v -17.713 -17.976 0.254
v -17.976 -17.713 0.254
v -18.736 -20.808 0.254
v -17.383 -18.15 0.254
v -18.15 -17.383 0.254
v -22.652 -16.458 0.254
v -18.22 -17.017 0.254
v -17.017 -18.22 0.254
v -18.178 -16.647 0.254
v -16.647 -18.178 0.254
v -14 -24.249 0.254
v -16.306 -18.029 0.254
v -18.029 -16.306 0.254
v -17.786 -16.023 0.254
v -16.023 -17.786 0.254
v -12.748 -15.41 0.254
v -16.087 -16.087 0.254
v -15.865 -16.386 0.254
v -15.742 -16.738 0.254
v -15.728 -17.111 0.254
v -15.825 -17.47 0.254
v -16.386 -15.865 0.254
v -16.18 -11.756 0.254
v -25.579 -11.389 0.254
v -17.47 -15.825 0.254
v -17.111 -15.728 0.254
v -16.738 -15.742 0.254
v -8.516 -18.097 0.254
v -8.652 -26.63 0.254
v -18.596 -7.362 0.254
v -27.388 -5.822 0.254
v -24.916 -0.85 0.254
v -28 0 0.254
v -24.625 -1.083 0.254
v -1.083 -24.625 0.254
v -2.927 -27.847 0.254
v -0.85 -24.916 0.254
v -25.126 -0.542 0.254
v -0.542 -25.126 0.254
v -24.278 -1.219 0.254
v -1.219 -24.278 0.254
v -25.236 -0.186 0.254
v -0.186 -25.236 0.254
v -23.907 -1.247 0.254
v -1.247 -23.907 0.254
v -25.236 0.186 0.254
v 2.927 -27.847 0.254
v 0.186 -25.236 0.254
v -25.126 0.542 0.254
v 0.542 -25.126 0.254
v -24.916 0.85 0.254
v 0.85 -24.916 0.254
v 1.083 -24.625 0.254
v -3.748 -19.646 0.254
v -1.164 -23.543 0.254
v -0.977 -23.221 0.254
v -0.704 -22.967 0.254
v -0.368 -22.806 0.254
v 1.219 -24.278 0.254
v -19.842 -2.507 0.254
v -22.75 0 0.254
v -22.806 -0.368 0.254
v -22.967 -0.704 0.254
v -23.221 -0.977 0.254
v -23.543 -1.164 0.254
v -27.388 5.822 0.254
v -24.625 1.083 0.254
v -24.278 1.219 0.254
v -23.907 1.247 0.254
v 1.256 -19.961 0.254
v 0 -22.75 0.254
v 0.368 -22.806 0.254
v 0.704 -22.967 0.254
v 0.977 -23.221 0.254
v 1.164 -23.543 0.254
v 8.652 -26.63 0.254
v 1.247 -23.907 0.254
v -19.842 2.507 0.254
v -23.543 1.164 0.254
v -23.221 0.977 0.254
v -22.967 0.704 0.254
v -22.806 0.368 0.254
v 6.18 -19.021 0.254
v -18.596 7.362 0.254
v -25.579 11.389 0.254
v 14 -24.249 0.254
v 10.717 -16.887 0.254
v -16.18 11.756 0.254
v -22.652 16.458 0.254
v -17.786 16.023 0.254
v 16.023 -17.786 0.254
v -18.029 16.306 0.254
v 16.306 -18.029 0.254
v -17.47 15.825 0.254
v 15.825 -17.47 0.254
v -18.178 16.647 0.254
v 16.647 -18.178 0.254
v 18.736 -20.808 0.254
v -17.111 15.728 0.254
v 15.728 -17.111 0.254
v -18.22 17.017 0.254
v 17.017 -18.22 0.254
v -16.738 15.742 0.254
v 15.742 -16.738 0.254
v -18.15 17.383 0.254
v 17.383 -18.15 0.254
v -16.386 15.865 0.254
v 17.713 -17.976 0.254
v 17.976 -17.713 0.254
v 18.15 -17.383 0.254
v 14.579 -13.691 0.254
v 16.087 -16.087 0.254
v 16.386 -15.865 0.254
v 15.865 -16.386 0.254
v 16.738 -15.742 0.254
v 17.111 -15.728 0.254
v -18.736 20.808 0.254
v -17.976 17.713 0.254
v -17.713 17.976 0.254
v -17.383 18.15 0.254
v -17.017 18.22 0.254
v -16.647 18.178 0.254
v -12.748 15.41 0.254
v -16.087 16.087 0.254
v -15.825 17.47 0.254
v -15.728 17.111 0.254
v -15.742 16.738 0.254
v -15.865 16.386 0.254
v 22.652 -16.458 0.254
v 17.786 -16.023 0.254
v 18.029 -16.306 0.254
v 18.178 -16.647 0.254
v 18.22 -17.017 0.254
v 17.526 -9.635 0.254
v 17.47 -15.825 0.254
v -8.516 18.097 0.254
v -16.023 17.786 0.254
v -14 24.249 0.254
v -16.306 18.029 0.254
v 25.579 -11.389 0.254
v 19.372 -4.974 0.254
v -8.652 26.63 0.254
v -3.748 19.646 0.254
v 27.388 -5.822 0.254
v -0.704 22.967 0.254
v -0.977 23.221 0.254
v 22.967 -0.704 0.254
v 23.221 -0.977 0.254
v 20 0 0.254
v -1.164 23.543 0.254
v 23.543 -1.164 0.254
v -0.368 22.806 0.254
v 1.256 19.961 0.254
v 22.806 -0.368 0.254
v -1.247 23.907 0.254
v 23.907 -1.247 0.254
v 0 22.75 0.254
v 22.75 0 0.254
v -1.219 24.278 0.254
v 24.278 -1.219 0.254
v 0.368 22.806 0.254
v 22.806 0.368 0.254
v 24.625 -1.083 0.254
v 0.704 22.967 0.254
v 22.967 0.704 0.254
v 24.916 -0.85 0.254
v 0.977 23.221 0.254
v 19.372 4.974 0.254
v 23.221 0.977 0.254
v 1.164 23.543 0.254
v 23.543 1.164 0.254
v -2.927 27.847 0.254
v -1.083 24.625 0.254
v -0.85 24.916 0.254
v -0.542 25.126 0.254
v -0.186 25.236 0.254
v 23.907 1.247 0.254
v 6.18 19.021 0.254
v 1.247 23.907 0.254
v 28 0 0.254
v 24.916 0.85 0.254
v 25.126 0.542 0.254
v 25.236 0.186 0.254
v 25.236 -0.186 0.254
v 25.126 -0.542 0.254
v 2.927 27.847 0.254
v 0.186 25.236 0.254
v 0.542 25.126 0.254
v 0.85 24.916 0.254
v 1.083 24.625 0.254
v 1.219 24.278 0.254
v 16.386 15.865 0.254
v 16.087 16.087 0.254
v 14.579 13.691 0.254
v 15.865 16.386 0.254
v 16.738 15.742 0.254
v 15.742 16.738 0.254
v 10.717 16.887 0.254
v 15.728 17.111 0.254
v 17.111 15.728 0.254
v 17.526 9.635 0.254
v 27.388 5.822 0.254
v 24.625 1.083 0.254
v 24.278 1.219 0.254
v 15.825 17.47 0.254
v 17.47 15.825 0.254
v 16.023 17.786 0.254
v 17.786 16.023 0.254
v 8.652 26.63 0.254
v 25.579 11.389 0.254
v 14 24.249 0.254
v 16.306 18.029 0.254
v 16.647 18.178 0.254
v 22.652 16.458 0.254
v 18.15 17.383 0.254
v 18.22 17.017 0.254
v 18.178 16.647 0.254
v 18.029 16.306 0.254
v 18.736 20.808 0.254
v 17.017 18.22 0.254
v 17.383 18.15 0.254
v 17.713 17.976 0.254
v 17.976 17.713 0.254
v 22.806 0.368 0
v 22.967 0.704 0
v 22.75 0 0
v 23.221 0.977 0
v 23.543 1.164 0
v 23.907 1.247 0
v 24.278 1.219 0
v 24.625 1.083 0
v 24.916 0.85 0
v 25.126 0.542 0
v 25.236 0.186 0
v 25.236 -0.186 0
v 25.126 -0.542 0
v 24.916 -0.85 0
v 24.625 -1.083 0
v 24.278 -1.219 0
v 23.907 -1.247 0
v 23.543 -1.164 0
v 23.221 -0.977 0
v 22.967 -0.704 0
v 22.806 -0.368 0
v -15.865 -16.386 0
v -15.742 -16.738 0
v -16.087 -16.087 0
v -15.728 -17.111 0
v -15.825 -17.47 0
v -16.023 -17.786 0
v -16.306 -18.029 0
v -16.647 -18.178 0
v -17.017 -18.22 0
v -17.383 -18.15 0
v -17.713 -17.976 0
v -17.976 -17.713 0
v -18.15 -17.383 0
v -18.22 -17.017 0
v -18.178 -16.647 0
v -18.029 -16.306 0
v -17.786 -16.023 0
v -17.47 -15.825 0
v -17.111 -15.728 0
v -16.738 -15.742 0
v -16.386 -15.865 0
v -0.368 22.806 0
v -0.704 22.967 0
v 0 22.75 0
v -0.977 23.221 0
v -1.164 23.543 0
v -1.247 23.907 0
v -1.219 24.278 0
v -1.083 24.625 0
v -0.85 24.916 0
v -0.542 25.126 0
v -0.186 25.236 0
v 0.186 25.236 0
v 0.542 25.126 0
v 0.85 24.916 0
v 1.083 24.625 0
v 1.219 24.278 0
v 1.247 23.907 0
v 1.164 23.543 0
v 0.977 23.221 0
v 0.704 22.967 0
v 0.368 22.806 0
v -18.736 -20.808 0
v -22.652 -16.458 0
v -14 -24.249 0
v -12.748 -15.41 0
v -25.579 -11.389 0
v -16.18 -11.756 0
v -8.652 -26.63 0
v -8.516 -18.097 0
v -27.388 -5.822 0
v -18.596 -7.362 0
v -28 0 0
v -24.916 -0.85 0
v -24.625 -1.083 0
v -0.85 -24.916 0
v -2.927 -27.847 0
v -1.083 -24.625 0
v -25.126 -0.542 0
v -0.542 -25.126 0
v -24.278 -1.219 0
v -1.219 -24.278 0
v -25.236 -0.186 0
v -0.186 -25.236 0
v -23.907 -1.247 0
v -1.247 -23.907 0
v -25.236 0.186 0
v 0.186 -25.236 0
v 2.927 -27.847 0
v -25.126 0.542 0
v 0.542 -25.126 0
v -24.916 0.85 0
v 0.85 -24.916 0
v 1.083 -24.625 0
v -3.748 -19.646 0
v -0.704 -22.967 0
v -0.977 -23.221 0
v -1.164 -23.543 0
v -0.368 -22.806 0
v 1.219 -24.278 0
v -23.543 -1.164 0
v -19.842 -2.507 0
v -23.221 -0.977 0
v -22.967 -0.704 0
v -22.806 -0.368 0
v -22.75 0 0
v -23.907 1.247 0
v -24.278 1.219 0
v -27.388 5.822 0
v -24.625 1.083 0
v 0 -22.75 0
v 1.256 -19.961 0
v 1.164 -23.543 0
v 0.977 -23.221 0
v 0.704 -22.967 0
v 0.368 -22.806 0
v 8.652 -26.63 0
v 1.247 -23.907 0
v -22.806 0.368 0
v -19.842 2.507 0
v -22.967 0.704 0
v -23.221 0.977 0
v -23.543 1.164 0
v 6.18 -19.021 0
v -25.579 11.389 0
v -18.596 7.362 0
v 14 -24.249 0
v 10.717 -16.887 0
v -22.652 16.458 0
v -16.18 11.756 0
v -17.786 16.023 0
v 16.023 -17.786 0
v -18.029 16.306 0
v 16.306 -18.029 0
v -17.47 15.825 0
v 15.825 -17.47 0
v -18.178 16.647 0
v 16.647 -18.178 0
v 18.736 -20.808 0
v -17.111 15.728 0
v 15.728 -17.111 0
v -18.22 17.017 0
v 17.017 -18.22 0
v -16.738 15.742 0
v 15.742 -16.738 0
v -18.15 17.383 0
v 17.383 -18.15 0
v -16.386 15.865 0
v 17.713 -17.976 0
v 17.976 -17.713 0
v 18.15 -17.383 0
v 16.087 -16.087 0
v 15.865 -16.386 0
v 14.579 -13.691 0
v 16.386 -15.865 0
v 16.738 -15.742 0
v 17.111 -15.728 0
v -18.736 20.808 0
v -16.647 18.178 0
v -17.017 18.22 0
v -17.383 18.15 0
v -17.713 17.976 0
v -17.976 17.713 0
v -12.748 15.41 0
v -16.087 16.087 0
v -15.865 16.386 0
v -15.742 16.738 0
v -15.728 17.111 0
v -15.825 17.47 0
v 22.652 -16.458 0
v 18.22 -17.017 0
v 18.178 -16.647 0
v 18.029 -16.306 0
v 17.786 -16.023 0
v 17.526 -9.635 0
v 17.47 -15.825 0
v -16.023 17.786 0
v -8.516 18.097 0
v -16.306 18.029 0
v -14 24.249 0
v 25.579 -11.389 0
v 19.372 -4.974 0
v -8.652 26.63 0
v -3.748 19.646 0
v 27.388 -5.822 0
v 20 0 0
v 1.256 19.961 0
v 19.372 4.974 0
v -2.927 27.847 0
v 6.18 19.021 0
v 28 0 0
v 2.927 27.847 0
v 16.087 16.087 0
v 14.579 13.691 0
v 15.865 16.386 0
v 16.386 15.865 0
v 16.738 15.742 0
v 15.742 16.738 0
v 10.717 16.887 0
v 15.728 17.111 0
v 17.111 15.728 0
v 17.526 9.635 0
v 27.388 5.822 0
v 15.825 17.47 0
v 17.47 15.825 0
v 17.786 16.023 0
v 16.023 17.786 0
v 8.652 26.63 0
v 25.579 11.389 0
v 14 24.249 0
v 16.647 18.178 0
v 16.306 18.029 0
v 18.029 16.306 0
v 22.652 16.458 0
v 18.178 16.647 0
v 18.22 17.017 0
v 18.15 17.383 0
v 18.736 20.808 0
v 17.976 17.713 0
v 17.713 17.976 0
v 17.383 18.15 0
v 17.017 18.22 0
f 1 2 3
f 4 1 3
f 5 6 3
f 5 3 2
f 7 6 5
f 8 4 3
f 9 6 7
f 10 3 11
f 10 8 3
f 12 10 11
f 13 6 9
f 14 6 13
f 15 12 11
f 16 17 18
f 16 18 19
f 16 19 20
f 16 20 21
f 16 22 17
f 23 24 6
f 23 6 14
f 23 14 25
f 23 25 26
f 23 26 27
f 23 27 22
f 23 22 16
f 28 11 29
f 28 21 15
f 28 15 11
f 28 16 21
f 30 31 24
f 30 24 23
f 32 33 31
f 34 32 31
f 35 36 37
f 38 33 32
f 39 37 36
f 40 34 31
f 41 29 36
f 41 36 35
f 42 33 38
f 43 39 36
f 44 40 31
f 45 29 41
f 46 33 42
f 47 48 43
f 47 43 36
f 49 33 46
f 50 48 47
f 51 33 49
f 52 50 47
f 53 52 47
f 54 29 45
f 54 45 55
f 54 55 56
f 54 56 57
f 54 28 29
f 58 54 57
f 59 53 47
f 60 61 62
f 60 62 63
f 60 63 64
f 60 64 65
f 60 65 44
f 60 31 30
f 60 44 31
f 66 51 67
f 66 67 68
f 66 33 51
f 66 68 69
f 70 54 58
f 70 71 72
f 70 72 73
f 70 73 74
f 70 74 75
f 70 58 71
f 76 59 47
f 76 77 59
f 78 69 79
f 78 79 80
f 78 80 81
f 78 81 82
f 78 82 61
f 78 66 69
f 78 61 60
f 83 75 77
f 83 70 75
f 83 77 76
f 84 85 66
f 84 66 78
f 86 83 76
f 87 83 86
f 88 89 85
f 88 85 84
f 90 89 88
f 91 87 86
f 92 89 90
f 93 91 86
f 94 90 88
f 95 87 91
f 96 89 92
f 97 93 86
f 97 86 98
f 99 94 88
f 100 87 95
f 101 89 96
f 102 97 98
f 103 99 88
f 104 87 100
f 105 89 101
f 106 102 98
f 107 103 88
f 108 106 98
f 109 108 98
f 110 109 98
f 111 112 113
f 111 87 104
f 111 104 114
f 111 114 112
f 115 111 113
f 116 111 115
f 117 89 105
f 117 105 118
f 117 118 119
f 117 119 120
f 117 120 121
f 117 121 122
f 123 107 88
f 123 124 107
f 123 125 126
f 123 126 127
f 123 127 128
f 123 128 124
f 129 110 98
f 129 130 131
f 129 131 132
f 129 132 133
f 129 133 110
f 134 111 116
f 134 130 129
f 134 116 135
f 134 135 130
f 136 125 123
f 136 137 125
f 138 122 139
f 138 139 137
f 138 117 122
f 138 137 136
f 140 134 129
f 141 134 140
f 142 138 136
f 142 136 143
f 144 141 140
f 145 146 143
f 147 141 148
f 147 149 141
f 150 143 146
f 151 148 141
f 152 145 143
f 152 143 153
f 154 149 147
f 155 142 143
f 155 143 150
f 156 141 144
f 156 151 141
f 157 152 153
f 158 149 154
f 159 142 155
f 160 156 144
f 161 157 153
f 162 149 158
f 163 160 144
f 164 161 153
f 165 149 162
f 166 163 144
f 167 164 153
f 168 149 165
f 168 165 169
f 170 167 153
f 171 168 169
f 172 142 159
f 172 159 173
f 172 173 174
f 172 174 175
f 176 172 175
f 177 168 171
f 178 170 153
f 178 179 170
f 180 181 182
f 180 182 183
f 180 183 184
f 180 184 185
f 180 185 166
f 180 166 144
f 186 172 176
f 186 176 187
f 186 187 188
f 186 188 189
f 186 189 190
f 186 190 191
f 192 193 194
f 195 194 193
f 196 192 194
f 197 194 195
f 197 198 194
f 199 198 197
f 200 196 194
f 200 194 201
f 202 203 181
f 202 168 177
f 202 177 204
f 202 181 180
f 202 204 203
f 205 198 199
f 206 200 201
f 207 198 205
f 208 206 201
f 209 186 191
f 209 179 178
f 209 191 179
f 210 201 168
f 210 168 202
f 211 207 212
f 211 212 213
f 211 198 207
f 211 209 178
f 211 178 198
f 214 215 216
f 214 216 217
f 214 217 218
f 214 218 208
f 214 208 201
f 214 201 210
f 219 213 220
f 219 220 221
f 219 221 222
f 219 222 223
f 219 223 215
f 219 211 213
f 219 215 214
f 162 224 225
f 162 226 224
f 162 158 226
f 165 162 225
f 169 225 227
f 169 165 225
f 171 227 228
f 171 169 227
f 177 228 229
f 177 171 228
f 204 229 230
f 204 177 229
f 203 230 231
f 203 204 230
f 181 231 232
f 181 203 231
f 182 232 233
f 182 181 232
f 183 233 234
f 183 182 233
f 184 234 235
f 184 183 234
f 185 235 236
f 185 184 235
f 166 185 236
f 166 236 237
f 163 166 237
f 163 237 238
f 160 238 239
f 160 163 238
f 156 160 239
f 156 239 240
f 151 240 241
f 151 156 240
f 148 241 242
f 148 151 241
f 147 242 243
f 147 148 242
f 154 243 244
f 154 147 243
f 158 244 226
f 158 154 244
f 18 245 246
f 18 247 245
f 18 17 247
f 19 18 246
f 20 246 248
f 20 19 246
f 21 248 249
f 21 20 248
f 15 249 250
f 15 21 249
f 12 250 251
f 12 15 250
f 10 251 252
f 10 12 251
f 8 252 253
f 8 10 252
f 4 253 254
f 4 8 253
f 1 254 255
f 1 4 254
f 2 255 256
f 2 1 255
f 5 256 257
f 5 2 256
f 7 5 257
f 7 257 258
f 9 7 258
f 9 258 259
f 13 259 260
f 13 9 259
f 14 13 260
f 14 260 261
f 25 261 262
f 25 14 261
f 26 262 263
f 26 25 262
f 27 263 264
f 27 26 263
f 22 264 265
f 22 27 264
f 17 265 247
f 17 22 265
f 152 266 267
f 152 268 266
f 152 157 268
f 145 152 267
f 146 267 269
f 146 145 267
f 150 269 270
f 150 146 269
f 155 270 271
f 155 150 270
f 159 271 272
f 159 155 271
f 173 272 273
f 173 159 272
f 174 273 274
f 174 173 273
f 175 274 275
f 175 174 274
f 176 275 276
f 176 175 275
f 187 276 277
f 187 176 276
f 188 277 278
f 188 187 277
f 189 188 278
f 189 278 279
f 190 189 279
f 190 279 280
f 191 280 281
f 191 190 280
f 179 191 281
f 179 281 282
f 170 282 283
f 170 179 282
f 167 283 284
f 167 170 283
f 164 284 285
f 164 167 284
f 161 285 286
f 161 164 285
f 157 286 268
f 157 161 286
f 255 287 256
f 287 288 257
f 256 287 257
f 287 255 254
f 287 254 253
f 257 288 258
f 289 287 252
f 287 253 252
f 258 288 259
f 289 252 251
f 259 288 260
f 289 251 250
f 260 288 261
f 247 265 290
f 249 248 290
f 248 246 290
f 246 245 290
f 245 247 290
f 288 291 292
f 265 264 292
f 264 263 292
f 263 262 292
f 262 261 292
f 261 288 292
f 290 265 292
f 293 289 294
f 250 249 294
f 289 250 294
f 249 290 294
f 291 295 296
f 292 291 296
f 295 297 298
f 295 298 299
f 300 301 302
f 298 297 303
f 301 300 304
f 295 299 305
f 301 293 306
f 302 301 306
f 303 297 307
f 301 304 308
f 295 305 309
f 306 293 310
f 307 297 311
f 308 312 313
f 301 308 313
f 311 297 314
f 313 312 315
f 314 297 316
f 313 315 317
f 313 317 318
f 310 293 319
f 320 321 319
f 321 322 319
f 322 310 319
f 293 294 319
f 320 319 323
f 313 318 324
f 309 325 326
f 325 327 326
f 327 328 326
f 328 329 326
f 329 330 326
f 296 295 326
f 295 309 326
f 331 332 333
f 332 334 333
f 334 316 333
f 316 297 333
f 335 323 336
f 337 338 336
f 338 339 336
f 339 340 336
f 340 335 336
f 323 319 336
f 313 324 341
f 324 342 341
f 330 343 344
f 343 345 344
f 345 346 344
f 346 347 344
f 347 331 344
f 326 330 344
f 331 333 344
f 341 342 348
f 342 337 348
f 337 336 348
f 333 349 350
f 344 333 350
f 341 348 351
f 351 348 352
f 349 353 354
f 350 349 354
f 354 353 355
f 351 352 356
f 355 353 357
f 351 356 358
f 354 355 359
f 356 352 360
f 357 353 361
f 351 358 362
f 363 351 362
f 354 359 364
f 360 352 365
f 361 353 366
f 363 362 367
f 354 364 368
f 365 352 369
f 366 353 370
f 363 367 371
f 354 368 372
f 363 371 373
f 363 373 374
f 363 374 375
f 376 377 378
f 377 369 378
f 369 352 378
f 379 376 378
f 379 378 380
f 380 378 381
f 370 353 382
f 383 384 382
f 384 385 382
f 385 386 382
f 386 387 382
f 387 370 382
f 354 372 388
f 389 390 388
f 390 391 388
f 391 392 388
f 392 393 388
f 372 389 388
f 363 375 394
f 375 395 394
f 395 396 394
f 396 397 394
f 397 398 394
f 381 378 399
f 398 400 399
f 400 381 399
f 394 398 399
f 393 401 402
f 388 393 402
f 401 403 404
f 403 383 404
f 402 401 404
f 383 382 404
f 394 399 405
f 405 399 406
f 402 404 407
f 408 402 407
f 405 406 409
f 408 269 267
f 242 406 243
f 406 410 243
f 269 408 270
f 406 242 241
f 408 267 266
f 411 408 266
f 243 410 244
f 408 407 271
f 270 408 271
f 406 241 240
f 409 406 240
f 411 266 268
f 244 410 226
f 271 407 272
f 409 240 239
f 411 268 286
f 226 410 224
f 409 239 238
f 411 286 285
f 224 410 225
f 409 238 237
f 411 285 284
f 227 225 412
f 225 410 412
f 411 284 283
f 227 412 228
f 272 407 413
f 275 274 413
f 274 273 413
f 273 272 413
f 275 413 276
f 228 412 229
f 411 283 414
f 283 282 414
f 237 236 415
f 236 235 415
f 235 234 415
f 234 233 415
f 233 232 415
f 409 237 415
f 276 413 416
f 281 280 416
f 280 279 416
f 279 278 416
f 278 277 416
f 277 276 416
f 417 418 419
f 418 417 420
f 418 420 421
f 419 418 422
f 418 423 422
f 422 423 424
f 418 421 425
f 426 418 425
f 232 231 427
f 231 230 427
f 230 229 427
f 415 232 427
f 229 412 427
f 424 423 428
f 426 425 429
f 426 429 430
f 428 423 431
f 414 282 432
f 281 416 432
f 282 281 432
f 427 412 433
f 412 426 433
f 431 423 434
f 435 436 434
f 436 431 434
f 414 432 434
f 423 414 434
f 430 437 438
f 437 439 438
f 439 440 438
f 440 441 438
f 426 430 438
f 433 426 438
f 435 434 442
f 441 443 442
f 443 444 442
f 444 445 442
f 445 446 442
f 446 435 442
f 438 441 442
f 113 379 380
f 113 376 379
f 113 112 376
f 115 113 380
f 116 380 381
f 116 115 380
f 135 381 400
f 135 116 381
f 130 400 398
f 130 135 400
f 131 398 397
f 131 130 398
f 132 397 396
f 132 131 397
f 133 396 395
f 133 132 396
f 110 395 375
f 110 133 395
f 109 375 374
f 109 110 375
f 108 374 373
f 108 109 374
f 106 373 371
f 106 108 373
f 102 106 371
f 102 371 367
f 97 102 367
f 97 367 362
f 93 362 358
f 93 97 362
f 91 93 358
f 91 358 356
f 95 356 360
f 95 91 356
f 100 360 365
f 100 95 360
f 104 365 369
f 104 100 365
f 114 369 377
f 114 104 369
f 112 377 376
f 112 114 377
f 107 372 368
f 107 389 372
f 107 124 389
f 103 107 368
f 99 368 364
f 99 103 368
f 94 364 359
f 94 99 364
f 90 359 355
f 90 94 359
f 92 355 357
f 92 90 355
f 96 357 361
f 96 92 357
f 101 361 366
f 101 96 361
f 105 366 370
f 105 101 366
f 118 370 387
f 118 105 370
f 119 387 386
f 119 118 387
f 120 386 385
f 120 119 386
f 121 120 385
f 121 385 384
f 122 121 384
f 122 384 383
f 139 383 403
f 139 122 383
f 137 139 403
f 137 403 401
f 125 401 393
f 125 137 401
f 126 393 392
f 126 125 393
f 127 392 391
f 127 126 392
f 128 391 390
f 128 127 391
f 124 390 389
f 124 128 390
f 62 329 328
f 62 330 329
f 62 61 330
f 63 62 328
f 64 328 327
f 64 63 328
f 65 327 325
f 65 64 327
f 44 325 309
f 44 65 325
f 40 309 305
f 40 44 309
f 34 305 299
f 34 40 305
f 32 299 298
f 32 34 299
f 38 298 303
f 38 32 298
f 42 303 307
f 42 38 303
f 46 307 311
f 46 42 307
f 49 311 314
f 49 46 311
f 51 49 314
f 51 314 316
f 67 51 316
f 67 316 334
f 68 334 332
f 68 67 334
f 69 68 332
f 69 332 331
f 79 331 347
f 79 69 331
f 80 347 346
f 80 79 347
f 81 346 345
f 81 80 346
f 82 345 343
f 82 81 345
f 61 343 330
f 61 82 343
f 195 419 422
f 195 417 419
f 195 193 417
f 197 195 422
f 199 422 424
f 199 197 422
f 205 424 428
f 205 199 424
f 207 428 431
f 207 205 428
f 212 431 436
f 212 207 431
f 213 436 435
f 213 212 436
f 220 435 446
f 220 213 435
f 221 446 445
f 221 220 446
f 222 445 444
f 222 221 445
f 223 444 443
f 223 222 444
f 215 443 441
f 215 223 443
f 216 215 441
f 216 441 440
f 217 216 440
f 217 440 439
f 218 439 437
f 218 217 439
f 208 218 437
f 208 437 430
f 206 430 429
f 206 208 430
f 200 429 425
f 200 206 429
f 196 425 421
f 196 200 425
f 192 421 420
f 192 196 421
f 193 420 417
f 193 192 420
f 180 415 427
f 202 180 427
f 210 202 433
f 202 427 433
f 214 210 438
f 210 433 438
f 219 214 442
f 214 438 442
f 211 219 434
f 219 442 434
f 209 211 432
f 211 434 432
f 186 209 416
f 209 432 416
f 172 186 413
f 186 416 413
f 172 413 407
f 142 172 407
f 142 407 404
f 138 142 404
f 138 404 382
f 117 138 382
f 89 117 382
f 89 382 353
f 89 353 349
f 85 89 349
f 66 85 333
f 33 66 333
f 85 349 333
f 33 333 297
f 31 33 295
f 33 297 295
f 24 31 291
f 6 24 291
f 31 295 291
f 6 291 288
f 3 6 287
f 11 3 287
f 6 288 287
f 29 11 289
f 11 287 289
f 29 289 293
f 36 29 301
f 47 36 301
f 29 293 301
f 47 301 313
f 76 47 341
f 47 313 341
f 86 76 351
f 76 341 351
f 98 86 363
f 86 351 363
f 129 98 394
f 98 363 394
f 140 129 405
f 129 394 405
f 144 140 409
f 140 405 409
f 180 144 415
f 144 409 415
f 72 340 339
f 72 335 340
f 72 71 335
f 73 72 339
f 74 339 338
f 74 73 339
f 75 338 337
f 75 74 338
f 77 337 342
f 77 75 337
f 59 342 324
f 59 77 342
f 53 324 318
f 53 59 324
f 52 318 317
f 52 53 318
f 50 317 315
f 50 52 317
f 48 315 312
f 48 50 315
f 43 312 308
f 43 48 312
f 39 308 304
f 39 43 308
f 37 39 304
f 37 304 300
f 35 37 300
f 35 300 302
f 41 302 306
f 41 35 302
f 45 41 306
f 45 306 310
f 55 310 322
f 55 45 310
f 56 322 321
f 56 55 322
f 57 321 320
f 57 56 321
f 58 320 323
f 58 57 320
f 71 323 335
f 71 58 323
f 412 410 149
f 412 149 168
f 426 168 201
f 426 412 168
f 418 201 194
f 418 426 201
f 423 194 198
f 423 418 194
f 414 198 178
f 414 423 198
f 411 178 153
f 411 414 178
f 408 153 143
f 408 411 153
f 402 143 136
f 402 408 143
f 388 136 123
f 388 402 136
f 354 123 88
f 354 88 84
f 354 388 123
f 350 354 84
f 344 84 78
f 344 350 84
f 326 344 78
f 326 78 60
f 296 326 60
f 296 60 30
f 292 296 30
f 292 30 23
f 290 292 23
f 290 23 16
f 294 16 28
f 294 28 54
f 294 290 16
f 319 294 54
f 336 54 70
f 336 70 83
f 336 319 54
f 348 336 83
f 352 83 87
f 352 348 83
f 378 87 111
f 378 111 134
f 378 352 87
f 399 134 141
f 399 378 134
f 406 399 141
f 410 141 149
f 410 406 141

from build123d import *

# Parameters (mm, degrees)
SKETCH1_R           = 28
SKETCH1_R_2         = 20
BOSS_EXTRUDE1_DEPTH = 0.254
CIRPATTERN1_COUNT   = 8


with BuildPart() as part:
    # Sketch1 → Boss-Extrude1 (new body)
    with BuildSketch(Plane.XY):
        Circle(SKETCH1_R)
        Circle(SKETCH1_R_2, mode=Mode.SUBTRACT)
    extrude(amount=BOSS_EXTRUDE1_DEPTH)

    # Sketch2 → Ø2.5 (2.5) Diameter Hole1 (revolve, cut)
    with BuildSketch(Plane(origin=(0, 24, 0.254), x_dir=(0, -1, 0), z_dir=(1, 0, 0))):
        Polygon((0, 0), (0, 2.251075774), (1.25, 1.5), (1.25, 0), align=None)
    f_2_5_2_5_diameter_hole1 = revolve(axis=Axis((0, 24, 6.604), (0, 0, -1)), mode=Mode.SUBTRACT)

    # CirPattern1: Ø2.5 (2.5) Diameter Hole1 ×8 about axis
    cirpattern1_axis = Axis((0, 0, -0.0127), (0, 0, -1))
    for i in range(1, CIRPATTERN1_COUNT):
        add(f_2_5_2_5_diameter_hole1.rotate(cirpattern1_axis, i * 360 / CIRPATTERN1_COUNT), mode=Mode.SUBTRACT)


solid = part.part
